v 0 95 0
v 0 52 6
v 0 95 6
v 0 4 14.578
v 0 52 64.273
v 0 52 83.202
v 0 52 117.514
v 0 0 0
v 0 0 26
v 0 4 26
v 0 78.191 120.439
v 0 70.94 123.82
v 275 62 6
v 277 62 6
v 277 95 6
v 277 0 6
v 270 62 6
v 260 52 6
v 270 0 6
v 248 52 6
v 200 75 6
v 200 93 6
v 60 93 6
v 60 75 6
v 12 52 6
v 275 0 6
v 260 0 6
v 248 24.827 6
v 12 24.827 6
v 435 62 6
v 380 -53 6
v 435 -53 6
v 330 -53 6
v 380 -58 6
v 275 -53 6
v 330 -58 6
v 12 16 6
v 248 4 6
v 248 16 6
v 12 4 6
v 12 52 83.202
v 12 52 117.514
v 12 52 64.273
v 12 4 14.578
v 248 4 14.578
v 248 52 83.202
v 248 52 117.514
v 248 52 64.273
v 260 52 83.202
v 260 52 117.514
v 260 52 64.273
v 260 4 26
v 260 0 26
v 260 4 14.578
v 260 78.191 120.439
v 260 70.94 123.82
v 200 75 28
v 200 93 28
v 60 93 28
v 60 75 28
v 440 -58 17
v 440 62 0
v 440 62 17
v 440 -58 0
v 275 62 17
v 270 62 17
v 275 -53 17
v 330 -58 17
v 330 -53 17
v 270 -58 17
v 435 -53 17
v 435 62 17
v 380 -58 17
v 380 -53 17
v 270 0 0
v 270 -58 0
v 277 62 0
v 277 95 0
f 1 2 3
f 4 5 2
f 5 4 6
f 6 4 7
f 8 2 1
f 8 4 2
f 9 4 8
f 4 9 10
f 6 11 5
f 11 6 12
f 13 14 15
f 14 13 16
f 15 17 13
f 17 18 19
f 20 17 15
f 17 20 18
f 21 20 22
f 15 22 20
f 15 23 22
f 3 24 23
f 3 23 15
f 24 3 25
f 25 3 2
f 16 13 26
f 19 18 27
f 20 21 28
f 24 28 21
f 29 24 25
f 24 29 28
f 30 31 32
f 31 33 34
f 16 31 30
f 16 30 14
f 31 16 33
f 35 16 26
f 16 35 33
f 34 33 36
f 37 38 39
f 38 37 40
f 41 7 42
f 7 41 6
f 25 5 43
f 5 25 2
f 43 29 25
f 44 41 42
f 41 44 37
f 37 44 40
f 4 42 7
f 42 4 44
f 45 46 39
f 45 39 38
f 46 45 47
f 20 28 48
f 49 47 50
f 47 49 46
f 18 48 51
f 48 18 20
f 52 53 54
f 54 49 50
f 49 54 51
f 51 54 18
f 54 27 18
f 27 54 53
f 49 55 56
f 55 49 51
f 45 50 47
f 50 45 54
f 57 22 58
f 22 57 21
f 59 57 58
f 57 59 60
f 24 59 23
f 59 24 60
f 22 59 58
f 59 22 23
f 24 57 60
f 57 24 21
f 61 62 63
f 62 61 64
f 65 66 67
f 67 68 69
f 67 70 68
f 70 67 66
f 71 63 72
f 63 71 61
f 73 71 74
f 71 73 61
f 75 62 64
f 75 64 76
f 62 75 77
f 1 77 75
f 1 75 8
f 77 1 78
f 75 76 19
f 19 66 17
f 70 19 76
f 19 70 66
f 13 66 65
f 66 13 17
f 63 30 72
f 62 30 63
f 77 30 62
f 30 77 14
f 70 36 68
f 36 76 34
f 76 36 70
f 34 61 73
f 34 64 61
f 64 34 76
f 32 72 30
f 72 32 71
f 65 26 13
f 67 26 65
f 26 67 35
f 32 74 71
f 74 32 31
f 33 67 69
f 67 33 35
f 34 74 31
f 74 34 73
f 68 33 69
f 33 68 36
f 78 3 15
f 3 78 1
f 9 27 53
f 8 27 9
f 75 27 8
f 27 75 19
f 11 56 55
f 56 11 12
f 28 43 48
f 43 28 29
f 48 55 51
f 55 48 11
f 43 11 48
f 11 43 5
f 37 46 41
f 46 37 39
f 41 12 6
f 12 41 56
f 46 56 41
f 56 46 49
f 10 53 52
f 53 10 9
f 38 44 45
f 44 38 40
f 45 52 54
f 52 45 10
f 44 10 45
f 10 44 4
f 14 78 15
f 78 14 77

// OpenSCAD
// vj_rig_stand.scad — single-piece VJ rig stand.
//
// Holds an iPad (TouchOSC) in an angled cradle behind the keyboard, an Apple
// Magic Trackpad in a tray that partly frames the keyboard's right side, and a
// 3x Lightning cable holder. One flat-based piece — it's wider than the 270 mm
// bed, so split it in your slicer where convenient and add joiners.

/* [iPad cradle] */
cw        = 260;   // cradle width (iPad 8 cased ≈ 257)
ipad_ang  = 65;    // lean from horizontal
chan_w    = 16;    // bottom channel for the cased iPad (flip cover folds behind)
panel_t   = 8;     // rest-panel thickness
panel_len = 130;   // rest-panel length up the slope
lip_h     = 20;    // front lip catching the iPad bottom edge
gusset_d  = 52;    // wedge depth (front to vertical back)
foot_d    = 95;    // base foot depth

/* [Trackpad tray] */
tp_w   = 160; tp_d = 115;   // Magic Trackpad
tp_wall = 5; tp_lip = 11;   // tray walls / lip
tray_gap = 10;              // gap from cradle right edge to tray
tray_fwd = 58;              // how far the tray is slid forward of the cradle front

/* [Cables] */
cable_n = 3; cable_d = 9; cable_pitch = 40;

base_t = 6;
$fn = 40;

module tray_box() {
    difference() {
        cube([tp_w + 2*tp_wall, tp_d + tp_wall, base_t + tp_lip]);
        translate([tp_wall, tp_wall, base_t]) cube([tp_w, tp_d, tp_lip + 1]);
        translate([(tp_w + 2*tp_wall)/2 - 25, -1, base_t]) cube([50, tp_wall + 2, tp_lip + 1]); // finger relief
    }
}

module vj_stand() {
    union() {
        // ---- iPad cradle ----
        cube([cw, foot_d, base_t]);                                       // base foot
        for (x = [0, cw - 12]) translate([x, 0, base_t]) rotate([90, 0, 90])  // side gussets
            linear_extrude(12) polygon([[0,0], [gusset_d,0], [gusset_d, gusset_d*tan(ipad_ang)]]);
        translate([0, chan_w, base_t]) rotate([-(90 - ipad_ang), 0, 0])       // iPad rest panel
            cube([cw, panel_t, panel_len]);
        cube([cw, 4, base_t + lip_h]);                                    // front lip / channel front
        difference() {                                                    // cable bar
            translate([cw/2 - (cable_n*cable_pitch)/2 - 10, foot_d - 20, base_t]) cube([cable_n*cable_pitch + 20, 18, 22]);
            for (i = [0 : cable_n-1]) translate([cw/2 + (i - (cable_n-1)/2)*cable_pitch, foot_d - 26, base_t + 14]) rotate([90,0,0]) cylinder(d = cable_d, h = 30);
        }
        // ---- flat connecting base (no lap, no step) ----
        translate([cw - 2, 0, 0]) cube([tray_gap + tp_wall + 4, foot_d, base_t]);
        // ---- trackpad tray (slid forward, partly framing the keyboard) ----
        translate([cw + tray_gap, -tray_fwd, 0]) tray_box();
    }
}

vj_stand();
